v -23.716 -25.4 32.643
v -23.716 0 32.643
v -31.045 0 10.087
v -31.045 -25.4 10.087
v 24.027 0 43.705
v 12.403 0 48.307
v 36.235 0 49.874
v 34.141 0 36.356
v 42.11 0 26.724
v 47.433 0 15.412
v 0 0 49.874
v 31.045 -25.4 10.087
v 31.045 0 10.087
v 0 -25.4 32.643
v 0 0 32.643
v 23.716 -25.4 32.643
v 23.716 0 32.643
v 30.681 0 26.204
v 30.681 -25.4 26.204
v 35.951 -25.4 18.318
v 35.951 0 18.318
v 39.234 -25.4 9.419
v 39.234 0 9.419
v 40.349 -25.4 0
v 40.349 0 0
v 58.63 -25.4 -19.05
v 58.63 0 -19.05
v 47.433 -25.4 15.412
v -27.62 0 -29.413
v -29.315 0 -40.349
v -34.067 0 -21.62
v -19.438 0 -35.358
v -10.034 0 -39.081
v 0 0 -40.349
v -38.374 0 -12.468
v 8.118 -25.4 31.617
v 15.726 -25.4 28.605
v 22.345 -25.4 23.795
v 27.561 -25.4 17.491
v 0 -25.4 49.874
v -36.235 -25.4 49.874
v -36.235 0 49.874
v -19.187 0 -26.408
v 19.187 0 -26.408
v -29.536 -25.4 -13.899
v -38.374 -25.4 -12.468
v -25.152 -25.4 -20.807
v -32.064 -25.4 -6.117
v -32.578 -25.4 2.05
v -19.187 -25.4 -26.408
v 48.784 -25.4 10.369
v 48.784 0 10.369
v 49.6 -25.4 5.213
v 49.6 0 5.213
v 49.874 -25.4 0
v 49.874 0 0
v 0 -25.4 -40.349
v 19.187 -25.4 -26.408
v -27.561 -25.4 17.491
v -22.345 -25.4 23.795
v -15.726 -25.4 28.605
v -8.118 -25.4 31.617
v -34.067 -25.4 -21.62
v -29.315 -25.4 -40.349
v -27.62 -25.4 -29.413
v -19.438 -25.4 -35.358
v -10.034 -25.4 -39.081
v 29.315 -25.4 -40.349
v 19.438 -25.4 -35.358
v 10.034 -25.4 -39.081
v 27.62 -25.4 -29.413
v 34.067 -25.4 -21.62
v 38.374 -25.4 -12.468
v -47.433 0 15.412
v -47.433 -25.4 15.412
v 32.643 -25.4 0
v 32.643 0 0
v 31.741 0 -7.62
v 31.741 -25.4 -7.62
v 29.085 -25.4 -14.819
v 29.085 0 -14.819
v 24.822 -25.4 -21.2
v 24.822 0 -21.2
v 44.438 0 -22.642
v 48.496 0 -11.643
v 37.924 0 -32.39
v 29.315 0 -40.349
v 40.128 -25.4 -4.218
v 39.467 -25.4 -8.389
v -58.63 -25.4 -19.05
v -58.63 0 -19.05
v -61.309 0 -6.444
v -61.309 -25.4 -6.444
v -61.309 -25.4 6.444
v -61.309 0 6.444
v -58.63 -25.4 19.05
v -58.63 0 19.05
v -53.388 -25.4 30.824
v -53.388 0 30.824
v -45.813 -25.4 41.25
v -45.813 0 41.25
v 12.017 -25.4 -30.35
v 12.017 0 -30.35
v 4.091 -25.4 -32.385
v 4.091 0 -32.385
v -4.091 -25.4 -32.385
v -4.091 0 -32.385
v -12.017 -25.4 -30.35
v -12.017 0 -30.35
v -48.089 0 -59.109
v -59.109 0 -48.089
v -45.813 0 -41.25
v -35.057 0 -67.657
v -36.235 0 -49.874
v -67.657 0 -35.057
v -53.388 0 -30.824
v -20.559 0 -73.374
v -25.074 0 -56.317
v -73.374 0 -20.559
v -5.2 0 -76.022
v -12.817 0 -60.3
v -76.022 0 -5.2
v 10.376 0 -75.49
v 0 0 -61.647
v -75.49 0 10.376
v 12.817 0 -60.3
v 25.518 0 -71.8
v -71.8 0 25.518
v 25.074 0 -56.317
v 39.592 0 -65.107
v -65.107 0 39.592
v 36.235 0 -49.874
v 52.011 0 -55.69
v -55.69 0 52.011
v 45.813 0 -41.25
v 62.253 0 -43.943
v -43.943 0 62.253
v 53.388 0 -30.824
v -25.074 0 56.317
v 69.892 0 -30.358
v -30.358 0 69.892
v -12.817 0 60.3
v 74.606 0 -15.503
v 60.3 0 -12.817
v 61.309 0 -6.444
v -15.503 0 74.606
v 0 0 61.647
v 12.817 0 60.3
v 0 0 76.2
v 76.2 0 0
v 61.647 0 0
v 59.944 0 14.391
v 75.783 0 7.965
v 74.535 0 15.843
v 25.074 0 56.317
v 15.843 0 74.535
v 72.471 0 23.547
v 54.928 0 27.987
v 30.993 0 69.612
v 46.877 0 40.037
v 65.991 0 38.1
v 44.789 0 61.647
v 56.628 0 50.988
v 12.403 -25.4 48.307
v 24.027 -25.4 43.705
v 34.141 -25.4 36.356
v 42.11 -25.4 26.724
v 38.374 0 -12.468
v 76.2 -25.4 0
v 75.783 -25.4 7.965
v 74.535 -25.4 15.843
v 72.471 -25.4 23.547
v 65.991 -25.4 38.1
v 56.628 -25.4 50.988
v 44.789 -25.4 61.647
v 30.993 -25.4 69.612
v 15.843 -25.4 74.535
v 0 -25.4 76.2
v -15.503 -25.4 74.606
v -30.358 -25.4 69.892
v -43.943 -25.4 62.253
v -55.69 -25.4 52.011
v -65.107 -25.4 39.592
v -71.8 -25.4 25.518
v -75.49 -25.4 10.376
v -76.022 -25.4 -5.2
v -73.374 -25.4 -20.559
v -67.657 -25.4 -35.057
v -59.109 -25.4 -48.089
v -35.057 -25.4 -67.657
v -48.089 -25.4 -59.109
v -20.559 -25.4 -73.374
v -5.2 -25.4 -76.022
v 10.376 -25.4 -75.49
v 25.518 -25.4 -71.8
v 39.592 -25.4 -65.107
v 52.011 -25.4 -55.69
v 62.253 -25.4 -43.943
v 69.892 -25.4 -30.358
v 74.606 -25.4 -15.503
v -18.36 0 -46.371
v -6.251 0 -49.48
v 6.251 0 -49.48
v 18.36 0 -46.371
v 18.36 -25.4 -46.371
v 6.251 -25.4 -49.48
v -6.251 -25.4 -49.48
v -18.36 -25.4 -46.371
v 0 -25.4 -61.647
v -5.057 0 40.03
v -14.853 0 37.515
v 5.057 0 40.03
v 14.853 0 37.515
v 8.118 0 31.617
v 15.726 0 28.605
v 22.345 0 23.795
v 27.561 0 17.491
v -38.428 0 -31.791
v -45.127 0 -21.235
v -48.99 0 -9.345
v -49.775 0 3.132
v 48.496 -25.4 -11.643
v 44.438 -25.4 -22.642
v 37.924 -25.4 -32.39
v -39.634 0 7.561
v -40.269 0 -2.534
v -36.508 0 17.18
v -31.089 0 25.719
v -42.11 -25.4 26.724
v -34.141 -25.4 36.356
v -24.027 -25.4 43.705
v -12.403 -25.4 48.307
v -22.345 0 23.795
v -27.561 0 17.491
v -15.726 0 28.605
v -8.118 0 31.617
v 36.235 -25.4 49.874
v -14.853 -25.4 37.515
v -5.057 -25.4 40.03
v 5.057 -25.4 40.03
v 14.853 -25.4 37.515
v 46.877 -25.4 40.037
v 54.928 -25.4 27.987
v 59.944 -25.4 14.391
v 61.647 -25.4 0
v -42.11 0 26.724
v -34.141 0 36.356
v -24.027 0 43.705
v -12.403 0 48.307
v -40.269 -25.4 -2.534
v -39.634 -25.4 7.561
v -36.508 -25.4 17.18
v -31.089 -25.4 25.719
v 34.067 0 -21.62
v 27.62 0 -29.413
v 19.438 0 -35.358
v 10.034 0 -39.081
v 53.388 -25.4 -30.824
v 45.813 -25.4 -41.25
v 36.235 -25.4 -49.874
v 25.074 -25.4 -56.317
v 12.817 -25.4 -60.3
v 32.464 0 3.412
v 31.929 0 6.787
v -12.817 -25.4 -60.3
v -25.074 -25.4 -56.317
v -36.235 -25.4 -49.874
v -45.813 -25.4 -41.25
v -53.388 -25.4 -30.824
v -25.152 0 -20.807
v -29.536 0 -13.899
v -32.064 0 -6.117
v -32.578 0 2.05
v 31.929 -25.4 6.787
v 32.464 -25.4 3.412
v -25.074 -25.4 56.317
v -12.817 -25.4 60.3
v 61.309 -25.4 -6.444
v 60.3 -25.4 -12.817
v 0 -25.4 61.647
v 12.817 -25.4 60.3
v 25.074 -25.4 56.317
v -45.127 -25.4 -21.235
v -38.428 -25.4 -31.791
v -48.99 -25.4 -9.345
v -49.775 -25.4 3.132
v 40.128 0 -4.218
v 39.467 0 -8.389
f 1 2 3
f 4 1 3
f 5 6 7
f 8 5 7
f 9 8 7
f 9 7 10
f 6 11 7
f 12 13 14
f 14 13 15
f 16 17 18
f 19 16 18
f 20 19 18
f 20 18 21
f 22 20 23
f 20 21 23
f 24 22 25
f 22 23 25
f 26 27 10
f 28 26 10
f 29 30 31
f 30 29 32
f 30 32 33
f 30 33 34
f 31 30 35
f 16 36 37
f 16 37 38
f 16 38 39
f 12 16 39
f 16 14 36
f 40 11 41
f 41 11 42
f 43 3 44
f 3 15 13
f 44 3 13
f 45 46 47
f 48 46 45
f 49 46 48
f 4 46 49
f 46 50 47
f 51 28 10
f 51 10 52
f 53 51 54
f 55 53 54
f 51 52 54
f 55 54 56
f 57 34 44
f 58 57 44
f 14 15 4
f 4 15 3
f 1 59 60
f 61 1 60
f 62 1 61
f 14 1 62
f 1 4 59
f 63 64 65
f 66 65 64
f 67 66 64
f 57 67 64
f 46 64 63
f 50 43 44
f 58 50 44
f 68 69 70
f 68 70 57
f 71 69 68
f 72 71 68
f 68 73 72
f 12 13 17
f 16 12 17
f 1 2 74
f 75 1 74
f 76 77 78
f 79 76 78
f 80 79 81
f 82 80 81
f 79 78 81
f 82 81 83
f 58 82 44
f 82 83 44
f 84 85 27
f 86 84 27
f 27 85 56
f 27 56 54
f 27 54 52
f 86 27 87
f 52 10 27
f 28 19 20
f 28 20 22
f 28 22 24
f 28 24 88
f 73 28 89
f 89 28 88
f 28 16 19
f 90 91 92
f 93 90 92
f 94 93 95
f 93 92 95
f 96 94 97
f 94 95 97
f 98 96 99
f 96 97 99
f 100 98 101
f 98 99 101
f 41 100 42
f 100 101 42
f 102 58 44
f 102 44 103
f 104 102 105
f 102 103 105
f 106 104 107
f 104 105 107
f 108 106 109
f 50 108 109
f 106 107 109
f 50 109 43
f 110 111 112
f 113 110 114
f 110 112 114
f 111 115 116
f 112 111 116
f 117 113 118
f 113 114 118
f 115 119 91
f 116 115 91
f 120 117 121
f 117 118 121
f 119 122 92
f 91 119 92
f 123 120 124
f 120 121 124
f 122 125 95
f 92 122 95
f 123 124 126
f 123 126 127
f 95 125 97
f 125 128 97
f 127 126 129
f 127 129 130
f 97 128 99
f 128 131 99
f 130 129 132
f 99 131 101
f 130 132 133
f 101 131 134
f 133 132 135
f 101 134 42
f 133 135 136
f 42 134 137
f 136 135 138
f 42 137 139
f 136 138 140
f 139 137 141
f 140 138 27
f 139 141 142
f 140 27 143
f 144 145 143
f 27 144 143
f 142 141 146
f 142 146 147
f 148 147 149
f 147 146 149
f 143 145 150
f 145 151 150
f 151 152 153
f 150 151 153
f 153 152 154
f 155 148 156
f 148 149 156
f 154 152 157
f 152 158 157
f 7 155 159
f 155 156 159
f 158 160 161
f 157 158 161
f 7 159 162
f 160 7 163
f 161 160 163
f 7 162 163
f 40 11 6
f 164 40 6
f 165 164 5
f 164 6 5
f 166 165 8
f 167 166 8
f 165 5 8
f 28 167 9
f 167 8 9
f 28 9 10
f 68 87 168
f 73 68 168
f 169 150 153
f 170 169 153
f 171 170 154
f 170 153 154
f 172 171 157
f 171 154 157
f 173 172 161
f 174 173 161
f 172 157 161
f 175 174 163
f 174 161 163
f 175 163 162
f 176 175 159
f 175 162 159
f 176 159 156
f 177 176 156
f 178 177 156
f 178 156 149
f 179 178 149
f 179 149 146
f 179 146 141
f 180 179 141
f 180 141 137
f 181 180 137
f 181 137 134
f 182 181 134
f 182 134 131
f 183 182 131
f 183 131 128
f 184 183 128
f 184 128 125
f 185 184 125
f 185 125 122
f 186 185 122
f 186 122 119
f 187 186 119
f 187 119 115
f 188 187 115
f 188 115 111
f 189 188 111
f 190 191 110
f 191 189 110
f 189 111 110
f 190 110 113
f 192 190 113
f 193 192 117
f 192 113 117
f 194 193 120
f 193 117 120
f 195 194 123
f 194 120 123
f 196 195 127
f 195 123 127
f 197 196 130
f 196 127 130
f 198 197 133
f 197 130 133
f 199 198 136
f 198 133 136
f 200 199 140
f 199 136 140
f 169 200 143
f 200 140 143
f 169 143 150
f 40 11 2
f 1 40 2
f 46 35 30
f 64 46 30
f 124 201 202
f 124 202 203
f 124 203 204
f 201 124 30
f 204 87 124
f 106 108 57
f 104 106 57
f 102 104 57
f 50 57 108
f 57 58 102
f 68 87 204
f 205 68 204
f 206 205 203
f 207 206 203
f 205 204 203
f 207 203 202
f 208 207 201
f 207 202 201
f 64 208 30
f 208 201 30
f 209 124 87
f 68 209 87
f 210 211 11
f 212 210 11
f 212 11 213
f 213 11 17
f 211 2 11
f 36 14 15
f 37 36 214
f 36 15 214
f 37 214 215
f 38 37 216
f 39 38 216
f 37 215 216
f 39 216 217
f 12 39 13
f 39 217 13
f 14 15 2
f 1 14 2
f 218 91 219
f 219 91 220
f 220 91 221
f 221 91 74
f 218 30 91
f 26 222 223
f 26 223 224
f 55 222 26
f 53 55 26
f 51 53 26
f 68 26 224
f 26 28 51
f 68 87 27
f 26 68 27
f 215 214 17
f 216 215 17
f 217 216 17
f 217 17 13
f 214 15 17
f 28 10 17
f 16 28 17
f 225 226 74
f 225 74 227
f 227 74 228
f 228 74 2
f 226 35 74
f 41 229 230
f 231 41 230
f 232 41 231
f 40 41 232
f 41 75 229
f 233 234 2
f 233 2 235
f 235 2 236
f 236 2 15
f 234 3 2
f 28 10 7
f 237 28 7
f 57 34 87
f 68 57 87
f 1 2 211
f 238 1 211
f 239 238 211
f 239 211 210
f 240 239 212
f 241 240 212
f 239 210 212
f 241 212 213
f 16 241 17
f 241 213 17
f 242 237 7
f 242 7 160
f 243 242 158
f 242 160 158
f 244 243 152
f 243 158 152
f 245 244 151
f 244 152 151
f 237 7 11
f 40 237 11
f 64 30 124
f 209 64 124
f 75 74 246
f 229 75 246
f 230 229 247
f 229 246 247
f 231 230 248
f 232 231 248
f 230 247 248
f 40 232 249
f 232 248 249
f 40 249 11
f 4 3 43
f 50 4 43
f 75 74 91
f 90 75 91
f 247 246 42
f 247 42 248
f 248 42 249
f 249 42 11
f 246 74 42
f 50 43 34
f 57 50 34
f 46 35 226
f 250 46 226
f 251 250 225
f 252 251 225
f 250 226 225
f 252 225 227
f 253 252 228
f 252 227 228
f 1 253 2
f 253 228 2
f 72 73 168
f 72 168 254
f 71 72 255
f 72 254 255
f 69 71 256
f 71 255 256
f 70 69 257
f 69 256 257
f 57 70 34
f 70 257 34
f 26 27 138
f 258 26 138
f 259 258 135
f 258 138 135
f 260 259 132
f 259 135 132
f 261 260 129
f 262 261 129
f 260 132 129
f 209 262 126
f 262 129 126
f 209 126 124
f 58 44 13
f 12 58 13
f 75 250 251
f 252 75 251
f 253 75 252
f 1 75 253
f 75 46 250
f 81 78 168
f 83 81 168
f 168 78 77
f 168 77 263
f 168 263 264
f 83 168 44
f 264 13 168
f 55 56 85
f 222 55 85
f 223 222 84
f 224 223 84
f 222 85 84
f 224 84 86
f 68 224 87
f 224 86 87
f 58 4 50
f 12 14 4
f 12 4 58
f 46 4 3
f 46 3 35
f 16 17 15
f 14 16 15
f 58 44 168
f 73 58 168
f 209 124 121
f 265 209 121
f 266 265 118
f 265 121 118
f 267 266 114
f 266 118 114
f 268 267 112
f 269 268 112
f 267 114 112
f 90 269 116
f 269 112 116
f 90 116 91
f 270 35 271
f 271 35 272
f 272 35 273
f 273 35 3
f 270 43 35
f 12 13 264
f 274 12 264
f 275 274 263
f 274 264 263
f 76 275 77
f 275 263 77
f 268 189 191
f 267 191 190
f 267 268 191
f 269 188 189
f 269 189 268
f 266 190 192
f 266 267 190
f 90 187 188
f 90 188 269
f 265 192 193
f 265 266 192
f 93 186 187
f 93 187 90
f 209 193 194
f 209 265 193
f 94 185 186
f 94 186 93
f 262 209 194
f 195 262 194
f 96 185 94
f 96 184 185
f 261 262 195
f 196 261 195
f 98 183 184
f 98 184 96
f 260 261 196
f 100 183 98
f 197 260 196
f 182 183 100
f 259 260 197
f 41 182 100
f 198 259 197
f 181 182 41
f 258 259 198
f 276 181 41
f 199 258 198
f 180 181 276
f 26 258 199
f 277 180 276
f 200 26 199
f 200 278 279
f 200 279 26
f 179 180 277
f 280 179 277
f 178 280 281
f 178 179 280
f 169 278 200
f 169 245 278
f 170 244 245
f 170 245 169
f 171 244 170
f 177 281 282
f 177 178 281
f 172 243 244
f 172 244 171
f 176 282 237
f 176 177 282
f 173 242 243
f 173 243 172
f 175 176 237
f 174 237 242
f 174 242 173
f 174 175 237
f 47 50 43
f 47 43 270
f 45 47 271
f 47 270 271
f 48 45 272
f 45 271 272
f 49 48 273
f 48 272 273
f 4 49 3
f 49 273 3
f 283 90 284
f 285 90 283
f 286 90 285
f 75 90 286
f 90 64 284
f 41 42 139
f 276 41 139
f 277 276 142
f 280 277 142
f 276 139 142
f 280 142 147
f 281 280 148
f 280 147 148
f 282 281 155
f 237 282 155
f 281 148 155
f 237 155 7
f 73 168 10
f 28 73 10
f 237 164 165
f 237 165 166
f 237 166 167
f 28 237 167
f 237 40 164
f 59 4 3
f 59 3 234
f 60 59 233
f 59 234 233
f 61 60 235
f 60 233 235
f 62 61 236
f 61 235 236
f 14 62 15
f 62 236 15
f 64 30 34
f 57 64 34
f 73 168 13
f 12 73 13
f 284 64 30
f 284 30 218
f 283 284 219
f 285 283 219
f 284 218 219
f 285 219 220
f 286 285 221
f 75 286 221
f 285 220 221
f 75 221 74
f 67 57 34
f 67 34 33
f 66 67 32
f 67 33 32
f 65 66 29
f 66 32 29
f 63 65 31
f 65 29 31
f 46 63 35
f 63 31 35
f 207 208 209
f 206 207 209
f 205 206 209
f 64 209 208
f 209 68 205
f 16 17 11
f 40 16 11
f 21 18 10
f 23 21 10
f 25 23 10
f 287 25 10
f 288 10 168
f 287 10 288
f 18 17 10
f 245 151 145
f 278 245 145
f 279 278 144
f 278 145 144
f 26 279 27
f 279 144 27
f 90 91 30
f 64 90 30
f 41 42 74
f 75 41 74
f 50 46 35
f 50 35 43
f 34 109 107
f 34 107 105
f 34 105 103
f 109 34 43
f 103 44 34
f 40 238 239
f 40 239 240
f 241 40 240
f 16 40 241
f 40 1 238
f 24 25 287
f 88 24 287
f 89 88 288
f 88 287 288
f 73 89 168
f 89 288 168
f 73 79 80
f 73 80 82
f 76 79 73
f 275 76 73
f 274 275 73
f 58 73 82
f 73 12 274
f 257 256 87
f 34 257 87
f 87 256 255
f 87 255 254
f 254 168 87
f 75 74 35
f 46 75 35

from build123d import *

# Parameters (mm, degrees)
F1_DEPTH = 25.4


with BuildPart() as f1:
    # F0 (on Front) → F1 (new body)
    with BuildSketch(Plane.XZ):
        with BuildLine():
            ThreePointArc((44.7892362247, -61.6470949714), (67.8946971432, -34.5940760802), (76.2, 0))
            ThreePointArc((76.2, 0), (75.2618515533, 11.9203062361), (72.4705065417, 23.5470949714))
            Line((72.4705065417, 23.5470949714), (58.6298713832, -19.05))
            Line((58.6298713832, -19.05), (44.7892362247, -61.6470949714))
        make_face()
        with BuildLine():
            Line((36.2352532708, 49.8735474857), (72.4705065417, 23.5470949714))
            ThreePointArc((72.4705065417, 23.5470949714), (44.7892362247, 61.6470949714), (0, 76.2))
            Line((0, 76.2), (36.2352532708, 49.8735474857))
        make_face()
        with BuildLine():
            Line((58.6298713832, -19.05), (72.4705065417, 23.5470949714))
            Line((72.4705065417, 23.5470949714), (36.2352532708, 49.8735474857))
            ThreePointArc((36.2352532708, 49.8735474857), (54.9279638168, 27.9871954535), (61.6470949714, 0))
            ThreePointArc((61.6470949714, 0), (60.8881169348, -9.6437303231), (58.6298713832, -19.05))
        make_face()
        with BuildLine():
            Line((0, -61.6470949714), (44.7892362247, -61.6470949714))
            Line((44.7892362247, -61.6470949714), (58.6298713832, -19.05))
            ThreePointArc((58.6298713832, -19.05), (36.2352532708, -49.8735474857), (0, -61.6470949714))
        make_face()
        with BuildLine():
            ThreePointArc((-44.7892362247, -61.6470949714), (0, -76.2), (44.7892362247, -61.6470949714))
            Line((44.7892362247, -61.6470949714), (0, -61.6470949714))
            Line((0, -61.6470949714), (-44.7892362247, -61.6470949714))
        make_face()
        with BuildLine():
            Line((-36.2352532708, 49.8735474857), (0, 76.2))
            ThreePointArc((0, 76.2), (-44.7892362247, 61.6470949714), (-72.4705065417, 23.5470949714))
            Line((-72.4705065417, 23.5470949714), (-36.2352532708, 49.8735474857))
        make_face()
        with BuildLine():
            Line((36.2352532708, 49.8735474857), (0, 76.2))
            Line((0, 76.2), (-36.2352532708, 49.8735474857))
            ThreePointArc((-36.2352532708, 49.8735474857), (0, 61.6470949714), (36.2352532708, 49.8735474857))
        make_face()
        with BuildLine():
            Line((-58.6298713832, -19.05), (-44.7892362247, -61.6470949714))
            Line((-44.7892362247, -61.6470949714), (0, -61.6470949714))
            ThreePointArc((0, -61.6470949714), (-36.2352532708, -49.8735474857), (-58.6298713832, -19.05))
        make_face()
        with BuildLine():
            ThreePointArc((-72.4705065417, 23.5470949714), (-72.4705065417, -23.5470949714), (-44.7892362247, -61.6470949714))
            Line((-44.7892362247, -61.6470949714), (-58.6298713832, -19.05))
            Line((-58.6298713832, -19.05), (-72.4705065417, 23.5470949714))
        make_face()
        with BuildLine():
            Line((-36.2352532708, 49.8735474857), (-72.4705065417, 23.5470949714))
            Line((-72.4705065417, 23.5470949714), (-58.6298713832, -19.05))
            ThreePointArc((-58.6298713832, -19.05), (-58.6298713832, 19.05), (-36.2352532708, 49.8735474857))
        make_face()
    extrude(amount=F1_DEPTH)


with BuildPart() as f1b:
    # F0 (on Front) → F1, piece 2 (new body)
    with BuildSketch(Plane.XZ):
        Polygon((31.0450150864, 10.0871368714), (0, 32.6426606143), (-31.0450150864, 10.0871368714), (-19.1868745047, -26.4084671786), (19.1868745047, -26.4084671786), align=None)
    extrude(amount=F1_DEPTH)


with BuildPart() as f1c:
    # F0 (on Front) → F1, piece 3 (new body)
    with BuildSketch(Plane.XZ):
        with BuildLine():
            Line((-31.0450150864, 10.0871368714), (-38.3737490093, -12.4683868714))
            Line((-38.3737490093, -12.4683868714), (-19.1868745047, -26.4084671786))
            ThreePointArc((-19.1868745047, -26.4084671786), (-31.0450150864, -10.0871368714), (-31.0450150864, 10.0871368714))
        make_face()
    extrude(amount=F1_DEPTH)


with BuildPart() as f1d:
    # F0 (on Front) → F1, piece 4 (new body)
    with BuildSketch(Plane.XZ):
        with BuildLine():
            Line((-19.1868745047, -26.4084671786), (0, -40.3485474857))
            Line((0, -40.3485474857), (19.1868745047, -26.4084671786))
            ThreePointArc((19.1868745047, -26.4084671786), (0, -32.6426606143), (-19.1868745047, -26.4084671786))
        make_face()
    extrude(amount=F1_DEPTH)


with BuildPart() as f1e:
    # F0 (on Front) → F1, piece 5 (new body)
    with BuildSketch(Plane.XZ):
        with BuildLine():
            Line((19.1868745047, -26.4084671786), (38.3737490093, -12.4683868714))
            Line((38.3737490093, -12.4683868714), (31.0450150864, 10.0871368714))
            ThreePointArc((31.0450150864, 10.0871368714), (32.2407752947, 5.1064371507), (32.6426606143, 0))
            ThreePointArc((32.6426606143, 0), (29.0848235742, -14.8194578051), (19.1868745047, -26.4084671786))
        make_face()
    extrude(amount=F1_DEPTH)


with BuildPart() as f1f:
    # F0 (on Front) → F1, piece 6 (new body)
    with BuildSketch(Plane.XZ):
        with BuildLine():
            Line((31.0450150864, 10.0871368714), (23.7162811635, 32.6426606143))
            Line((23.7162811635, 32.6426606143), (0, 32.6426606143))
            ThreePointArc((0, 32.6426606143), (19.1868745047, 26.4084671786), (31.0450150864, 10.0871368714))
        make_face()
    extrude(amount=F1_DEPTH)


with BuildPart() as f1g:
    # F0 (on Front) → F1, piece 7 (new body)
    with BuildSketch(Plane.XZ):
        with BuildLine():
            Line((0, 32.6426606143), (-23.7162811635, 32.6426606143))
            Line((-23.7162811635, 32.6426606143), (-31.0450150864, 10.0871368714))
            ThreePointArc((-31.0450150864, 10.0871368714), (-19.1868745047, 26.4084671786), (0, 32.6426606143))
        make_face()
    extrude(amount=F1_DEPTH)


with BuildPart() as f1h:
    # F0 (on Front) → F1, piece 8 (new body)
    with BuildSketch(Plane.XZ):
        with BuildLine():
            Line((-23.7162811635, 32.6426606143), (-47.432562327, 15.4117737428))
            Line((-47.432562327, 15.4117737428), (-38.3737490093, -12.4683868714))
            ThreePointArc((-38.3737490093, -12.4683868714), (-38.3737490093, 12.4683868714), (-23.7162811635, 32.6426606143))
        make_face()
    extrude(amount=F1_DEPTH)


with BuildPart() as f1i:
    # F0 (on Front) → F1, piece 9 (new body)
    with BuildSketch(Plane.XZ):
        with BuildLine():
            Line((-38.3737490093, -12.4683868714), (-29.3149356916, -40.3485474857))
            Line((-29.3149356916, -40.3485474857), (0, -40.3485474857))
            ThreePointArc((0, -40.3485474857), (-23.7162811635, -32.6426606143), (-38.3737490093, -12.4683868714))
        make_face()
    extrude(amount=F1_DEPTH)


with BuildPart() as f1j:
    # F0 (on Front) → F1, piece 10 (new body)
    with BuildSketch(Plane.XZ):
        with BuildLine():
            Line((0, -40.3485474857), (29.3149356916, -40.3485474857))
            Line((29.3149356916, -40.3485474857), (38.3737490093, -12.4683868714))
            ThreePointArc((38.3737490093, -12.4683868714), (23.7162811635, -32.6426606143), (0, -40.3485474857))
        make_face()
    extrude(amount=F1_DEPTH)


with BuildPart() as f1k:
    # F0 (on Front) → F1, piece 11 (new body)
    with BuildSketch(Plane.XZ):
        with BuildLine():
            Line((38.3737490093, -12.4683868714), (47.432562327, 15.4117737428))
            Line((47.432562327, 15.4117737428), (23.7162811635, 32.6426606143))
            ThreePointArc((23.7162811635, 32.6426606143), (35.9508190513, 18.3178572368), (40.3485474857, 0))
            ThreePointArc((40.3485474857, 0), (39.8517899116, -6.3119034411), (38.3737490093, -12.4683868714))
        make_face()
    extrude(amount=F1_DEPTH)


with BuildPart() as f1l:
    # F0 (on Front) → F1, piece 12 (new body)
    with BuildSketch(Plane.XZ):
        with BuildLine():
            Line((23.7162811635, 32.6426606143), (0, 49.8735474857))
            Line((0, 49.8735474857), (-23.7162811635, 32.6426606143))
            ThreePointArc((-23.7162811635, 32.6426606143), (0, 40.3485474857), (23.7162811635, 32.6426606143))
        make_face()
    extrude(amount=F1_DEPTH)


with BuildPart() as f1m:
    # F0 (on Front) → F1, piece 13 (new body)
    with BuildSketch(Plane.XZ):
        with BuildLine():
            Line((0, 49.8735474857), (-36.2352532708, 49.8735474857))
            Line((-36.2352532708, 49.8735474857), (-47.432562327, 15.4117737428))
            ThreePointArc((-47.432562327, 15.4117737428), (-29.3149356916, 40.3485474857), (0, 49.8735474857))
        make_face()
    extrude(amount=F1_DEPTH)


with BuildPart() as f1n:
    # F0 (on Front) → F1, piece 14 (new body)
    with BuildSketch(Plane.XZ):
        with BuildLine():
            Line((-47.432562327, 15.4117737428), (-58.6298713832, -19.05))
            Line((-58.6298713832, -19.05), (-29.3149356916, -40.3485474857))
            ThreePointArc((-29.3149356916, -40.3485474857), (-47.432562327, -15.4117737428), (-47.432562327, 15.4117737428))
        make_face()
    extrude(amount=F1_DEPTH)


with BuildPart() as f1o:
    # F0 (on Front) → F1, piece 15 (new body)
    with BuildSketch(Plane.XZ):
        with BuildLine():
            Line((-29.3149356916, -40.3485474857), (0, -61.6470949714))
            Line((0, -61.6470949714), (29.3149356916, -40.3485474857))
            ThreePointArc((29.3149356916, -40.3485474857), (0, -49.8735474857), (-29.3149356916, -40.3485474857))
        make_face()
    extrude(amount=F1_DEPTH)


with BuildPart() as f1p:
    # F0 (on Front) → F1, piece 16 (new body)
    with BuildSketch(Plane.XZ):
        with BuildLine():
            Line((29.3149356916, -40.3485474857), (58.6298713832, -19.05))
            Line((58.6298713832, -19.05), (47.432562327, 15.4117737428))
            ThreePointArc((47.432562327, 15.4117737428), (49.2595213557, 7.8019417206), (49.8735474857, 0))
            ThreePointArc((49.8735474857, 0), (44.4376561942, -22.6421167468), (29.3149356916, -40.3485474857))
        make_face()
    extrude(amount=F1_DEPTH)


with BuildPart() as f1q:
    # F0 (on Front) → F1, piece 17 (new body)
    with BuildSketch(Plane.XZ):
        with BuildLine():
            Line((47.432562327, 15.4117737428), (36.2352532708, 49.8735474857))
            Line((36.2352532708, 49.8735474857), (0, 49.8735474857))
            ThreePointArc((0, 49.8735474857), (29.3149356916, 40.3485474857), (47.432562327, 15.4117737428))
        make_face()
    extrude(amount=F1_DEPTH)


solid = Compound([f1.part, f1b.part, f1c.part, f1d.part, f1e.part, f1f.part, f1g.part, f1h.part, f1i.part, f1j.part, f1k.part, f1l.part, f1m.part, f1n.part, f1o.part, f1p.part, f1q.part])
